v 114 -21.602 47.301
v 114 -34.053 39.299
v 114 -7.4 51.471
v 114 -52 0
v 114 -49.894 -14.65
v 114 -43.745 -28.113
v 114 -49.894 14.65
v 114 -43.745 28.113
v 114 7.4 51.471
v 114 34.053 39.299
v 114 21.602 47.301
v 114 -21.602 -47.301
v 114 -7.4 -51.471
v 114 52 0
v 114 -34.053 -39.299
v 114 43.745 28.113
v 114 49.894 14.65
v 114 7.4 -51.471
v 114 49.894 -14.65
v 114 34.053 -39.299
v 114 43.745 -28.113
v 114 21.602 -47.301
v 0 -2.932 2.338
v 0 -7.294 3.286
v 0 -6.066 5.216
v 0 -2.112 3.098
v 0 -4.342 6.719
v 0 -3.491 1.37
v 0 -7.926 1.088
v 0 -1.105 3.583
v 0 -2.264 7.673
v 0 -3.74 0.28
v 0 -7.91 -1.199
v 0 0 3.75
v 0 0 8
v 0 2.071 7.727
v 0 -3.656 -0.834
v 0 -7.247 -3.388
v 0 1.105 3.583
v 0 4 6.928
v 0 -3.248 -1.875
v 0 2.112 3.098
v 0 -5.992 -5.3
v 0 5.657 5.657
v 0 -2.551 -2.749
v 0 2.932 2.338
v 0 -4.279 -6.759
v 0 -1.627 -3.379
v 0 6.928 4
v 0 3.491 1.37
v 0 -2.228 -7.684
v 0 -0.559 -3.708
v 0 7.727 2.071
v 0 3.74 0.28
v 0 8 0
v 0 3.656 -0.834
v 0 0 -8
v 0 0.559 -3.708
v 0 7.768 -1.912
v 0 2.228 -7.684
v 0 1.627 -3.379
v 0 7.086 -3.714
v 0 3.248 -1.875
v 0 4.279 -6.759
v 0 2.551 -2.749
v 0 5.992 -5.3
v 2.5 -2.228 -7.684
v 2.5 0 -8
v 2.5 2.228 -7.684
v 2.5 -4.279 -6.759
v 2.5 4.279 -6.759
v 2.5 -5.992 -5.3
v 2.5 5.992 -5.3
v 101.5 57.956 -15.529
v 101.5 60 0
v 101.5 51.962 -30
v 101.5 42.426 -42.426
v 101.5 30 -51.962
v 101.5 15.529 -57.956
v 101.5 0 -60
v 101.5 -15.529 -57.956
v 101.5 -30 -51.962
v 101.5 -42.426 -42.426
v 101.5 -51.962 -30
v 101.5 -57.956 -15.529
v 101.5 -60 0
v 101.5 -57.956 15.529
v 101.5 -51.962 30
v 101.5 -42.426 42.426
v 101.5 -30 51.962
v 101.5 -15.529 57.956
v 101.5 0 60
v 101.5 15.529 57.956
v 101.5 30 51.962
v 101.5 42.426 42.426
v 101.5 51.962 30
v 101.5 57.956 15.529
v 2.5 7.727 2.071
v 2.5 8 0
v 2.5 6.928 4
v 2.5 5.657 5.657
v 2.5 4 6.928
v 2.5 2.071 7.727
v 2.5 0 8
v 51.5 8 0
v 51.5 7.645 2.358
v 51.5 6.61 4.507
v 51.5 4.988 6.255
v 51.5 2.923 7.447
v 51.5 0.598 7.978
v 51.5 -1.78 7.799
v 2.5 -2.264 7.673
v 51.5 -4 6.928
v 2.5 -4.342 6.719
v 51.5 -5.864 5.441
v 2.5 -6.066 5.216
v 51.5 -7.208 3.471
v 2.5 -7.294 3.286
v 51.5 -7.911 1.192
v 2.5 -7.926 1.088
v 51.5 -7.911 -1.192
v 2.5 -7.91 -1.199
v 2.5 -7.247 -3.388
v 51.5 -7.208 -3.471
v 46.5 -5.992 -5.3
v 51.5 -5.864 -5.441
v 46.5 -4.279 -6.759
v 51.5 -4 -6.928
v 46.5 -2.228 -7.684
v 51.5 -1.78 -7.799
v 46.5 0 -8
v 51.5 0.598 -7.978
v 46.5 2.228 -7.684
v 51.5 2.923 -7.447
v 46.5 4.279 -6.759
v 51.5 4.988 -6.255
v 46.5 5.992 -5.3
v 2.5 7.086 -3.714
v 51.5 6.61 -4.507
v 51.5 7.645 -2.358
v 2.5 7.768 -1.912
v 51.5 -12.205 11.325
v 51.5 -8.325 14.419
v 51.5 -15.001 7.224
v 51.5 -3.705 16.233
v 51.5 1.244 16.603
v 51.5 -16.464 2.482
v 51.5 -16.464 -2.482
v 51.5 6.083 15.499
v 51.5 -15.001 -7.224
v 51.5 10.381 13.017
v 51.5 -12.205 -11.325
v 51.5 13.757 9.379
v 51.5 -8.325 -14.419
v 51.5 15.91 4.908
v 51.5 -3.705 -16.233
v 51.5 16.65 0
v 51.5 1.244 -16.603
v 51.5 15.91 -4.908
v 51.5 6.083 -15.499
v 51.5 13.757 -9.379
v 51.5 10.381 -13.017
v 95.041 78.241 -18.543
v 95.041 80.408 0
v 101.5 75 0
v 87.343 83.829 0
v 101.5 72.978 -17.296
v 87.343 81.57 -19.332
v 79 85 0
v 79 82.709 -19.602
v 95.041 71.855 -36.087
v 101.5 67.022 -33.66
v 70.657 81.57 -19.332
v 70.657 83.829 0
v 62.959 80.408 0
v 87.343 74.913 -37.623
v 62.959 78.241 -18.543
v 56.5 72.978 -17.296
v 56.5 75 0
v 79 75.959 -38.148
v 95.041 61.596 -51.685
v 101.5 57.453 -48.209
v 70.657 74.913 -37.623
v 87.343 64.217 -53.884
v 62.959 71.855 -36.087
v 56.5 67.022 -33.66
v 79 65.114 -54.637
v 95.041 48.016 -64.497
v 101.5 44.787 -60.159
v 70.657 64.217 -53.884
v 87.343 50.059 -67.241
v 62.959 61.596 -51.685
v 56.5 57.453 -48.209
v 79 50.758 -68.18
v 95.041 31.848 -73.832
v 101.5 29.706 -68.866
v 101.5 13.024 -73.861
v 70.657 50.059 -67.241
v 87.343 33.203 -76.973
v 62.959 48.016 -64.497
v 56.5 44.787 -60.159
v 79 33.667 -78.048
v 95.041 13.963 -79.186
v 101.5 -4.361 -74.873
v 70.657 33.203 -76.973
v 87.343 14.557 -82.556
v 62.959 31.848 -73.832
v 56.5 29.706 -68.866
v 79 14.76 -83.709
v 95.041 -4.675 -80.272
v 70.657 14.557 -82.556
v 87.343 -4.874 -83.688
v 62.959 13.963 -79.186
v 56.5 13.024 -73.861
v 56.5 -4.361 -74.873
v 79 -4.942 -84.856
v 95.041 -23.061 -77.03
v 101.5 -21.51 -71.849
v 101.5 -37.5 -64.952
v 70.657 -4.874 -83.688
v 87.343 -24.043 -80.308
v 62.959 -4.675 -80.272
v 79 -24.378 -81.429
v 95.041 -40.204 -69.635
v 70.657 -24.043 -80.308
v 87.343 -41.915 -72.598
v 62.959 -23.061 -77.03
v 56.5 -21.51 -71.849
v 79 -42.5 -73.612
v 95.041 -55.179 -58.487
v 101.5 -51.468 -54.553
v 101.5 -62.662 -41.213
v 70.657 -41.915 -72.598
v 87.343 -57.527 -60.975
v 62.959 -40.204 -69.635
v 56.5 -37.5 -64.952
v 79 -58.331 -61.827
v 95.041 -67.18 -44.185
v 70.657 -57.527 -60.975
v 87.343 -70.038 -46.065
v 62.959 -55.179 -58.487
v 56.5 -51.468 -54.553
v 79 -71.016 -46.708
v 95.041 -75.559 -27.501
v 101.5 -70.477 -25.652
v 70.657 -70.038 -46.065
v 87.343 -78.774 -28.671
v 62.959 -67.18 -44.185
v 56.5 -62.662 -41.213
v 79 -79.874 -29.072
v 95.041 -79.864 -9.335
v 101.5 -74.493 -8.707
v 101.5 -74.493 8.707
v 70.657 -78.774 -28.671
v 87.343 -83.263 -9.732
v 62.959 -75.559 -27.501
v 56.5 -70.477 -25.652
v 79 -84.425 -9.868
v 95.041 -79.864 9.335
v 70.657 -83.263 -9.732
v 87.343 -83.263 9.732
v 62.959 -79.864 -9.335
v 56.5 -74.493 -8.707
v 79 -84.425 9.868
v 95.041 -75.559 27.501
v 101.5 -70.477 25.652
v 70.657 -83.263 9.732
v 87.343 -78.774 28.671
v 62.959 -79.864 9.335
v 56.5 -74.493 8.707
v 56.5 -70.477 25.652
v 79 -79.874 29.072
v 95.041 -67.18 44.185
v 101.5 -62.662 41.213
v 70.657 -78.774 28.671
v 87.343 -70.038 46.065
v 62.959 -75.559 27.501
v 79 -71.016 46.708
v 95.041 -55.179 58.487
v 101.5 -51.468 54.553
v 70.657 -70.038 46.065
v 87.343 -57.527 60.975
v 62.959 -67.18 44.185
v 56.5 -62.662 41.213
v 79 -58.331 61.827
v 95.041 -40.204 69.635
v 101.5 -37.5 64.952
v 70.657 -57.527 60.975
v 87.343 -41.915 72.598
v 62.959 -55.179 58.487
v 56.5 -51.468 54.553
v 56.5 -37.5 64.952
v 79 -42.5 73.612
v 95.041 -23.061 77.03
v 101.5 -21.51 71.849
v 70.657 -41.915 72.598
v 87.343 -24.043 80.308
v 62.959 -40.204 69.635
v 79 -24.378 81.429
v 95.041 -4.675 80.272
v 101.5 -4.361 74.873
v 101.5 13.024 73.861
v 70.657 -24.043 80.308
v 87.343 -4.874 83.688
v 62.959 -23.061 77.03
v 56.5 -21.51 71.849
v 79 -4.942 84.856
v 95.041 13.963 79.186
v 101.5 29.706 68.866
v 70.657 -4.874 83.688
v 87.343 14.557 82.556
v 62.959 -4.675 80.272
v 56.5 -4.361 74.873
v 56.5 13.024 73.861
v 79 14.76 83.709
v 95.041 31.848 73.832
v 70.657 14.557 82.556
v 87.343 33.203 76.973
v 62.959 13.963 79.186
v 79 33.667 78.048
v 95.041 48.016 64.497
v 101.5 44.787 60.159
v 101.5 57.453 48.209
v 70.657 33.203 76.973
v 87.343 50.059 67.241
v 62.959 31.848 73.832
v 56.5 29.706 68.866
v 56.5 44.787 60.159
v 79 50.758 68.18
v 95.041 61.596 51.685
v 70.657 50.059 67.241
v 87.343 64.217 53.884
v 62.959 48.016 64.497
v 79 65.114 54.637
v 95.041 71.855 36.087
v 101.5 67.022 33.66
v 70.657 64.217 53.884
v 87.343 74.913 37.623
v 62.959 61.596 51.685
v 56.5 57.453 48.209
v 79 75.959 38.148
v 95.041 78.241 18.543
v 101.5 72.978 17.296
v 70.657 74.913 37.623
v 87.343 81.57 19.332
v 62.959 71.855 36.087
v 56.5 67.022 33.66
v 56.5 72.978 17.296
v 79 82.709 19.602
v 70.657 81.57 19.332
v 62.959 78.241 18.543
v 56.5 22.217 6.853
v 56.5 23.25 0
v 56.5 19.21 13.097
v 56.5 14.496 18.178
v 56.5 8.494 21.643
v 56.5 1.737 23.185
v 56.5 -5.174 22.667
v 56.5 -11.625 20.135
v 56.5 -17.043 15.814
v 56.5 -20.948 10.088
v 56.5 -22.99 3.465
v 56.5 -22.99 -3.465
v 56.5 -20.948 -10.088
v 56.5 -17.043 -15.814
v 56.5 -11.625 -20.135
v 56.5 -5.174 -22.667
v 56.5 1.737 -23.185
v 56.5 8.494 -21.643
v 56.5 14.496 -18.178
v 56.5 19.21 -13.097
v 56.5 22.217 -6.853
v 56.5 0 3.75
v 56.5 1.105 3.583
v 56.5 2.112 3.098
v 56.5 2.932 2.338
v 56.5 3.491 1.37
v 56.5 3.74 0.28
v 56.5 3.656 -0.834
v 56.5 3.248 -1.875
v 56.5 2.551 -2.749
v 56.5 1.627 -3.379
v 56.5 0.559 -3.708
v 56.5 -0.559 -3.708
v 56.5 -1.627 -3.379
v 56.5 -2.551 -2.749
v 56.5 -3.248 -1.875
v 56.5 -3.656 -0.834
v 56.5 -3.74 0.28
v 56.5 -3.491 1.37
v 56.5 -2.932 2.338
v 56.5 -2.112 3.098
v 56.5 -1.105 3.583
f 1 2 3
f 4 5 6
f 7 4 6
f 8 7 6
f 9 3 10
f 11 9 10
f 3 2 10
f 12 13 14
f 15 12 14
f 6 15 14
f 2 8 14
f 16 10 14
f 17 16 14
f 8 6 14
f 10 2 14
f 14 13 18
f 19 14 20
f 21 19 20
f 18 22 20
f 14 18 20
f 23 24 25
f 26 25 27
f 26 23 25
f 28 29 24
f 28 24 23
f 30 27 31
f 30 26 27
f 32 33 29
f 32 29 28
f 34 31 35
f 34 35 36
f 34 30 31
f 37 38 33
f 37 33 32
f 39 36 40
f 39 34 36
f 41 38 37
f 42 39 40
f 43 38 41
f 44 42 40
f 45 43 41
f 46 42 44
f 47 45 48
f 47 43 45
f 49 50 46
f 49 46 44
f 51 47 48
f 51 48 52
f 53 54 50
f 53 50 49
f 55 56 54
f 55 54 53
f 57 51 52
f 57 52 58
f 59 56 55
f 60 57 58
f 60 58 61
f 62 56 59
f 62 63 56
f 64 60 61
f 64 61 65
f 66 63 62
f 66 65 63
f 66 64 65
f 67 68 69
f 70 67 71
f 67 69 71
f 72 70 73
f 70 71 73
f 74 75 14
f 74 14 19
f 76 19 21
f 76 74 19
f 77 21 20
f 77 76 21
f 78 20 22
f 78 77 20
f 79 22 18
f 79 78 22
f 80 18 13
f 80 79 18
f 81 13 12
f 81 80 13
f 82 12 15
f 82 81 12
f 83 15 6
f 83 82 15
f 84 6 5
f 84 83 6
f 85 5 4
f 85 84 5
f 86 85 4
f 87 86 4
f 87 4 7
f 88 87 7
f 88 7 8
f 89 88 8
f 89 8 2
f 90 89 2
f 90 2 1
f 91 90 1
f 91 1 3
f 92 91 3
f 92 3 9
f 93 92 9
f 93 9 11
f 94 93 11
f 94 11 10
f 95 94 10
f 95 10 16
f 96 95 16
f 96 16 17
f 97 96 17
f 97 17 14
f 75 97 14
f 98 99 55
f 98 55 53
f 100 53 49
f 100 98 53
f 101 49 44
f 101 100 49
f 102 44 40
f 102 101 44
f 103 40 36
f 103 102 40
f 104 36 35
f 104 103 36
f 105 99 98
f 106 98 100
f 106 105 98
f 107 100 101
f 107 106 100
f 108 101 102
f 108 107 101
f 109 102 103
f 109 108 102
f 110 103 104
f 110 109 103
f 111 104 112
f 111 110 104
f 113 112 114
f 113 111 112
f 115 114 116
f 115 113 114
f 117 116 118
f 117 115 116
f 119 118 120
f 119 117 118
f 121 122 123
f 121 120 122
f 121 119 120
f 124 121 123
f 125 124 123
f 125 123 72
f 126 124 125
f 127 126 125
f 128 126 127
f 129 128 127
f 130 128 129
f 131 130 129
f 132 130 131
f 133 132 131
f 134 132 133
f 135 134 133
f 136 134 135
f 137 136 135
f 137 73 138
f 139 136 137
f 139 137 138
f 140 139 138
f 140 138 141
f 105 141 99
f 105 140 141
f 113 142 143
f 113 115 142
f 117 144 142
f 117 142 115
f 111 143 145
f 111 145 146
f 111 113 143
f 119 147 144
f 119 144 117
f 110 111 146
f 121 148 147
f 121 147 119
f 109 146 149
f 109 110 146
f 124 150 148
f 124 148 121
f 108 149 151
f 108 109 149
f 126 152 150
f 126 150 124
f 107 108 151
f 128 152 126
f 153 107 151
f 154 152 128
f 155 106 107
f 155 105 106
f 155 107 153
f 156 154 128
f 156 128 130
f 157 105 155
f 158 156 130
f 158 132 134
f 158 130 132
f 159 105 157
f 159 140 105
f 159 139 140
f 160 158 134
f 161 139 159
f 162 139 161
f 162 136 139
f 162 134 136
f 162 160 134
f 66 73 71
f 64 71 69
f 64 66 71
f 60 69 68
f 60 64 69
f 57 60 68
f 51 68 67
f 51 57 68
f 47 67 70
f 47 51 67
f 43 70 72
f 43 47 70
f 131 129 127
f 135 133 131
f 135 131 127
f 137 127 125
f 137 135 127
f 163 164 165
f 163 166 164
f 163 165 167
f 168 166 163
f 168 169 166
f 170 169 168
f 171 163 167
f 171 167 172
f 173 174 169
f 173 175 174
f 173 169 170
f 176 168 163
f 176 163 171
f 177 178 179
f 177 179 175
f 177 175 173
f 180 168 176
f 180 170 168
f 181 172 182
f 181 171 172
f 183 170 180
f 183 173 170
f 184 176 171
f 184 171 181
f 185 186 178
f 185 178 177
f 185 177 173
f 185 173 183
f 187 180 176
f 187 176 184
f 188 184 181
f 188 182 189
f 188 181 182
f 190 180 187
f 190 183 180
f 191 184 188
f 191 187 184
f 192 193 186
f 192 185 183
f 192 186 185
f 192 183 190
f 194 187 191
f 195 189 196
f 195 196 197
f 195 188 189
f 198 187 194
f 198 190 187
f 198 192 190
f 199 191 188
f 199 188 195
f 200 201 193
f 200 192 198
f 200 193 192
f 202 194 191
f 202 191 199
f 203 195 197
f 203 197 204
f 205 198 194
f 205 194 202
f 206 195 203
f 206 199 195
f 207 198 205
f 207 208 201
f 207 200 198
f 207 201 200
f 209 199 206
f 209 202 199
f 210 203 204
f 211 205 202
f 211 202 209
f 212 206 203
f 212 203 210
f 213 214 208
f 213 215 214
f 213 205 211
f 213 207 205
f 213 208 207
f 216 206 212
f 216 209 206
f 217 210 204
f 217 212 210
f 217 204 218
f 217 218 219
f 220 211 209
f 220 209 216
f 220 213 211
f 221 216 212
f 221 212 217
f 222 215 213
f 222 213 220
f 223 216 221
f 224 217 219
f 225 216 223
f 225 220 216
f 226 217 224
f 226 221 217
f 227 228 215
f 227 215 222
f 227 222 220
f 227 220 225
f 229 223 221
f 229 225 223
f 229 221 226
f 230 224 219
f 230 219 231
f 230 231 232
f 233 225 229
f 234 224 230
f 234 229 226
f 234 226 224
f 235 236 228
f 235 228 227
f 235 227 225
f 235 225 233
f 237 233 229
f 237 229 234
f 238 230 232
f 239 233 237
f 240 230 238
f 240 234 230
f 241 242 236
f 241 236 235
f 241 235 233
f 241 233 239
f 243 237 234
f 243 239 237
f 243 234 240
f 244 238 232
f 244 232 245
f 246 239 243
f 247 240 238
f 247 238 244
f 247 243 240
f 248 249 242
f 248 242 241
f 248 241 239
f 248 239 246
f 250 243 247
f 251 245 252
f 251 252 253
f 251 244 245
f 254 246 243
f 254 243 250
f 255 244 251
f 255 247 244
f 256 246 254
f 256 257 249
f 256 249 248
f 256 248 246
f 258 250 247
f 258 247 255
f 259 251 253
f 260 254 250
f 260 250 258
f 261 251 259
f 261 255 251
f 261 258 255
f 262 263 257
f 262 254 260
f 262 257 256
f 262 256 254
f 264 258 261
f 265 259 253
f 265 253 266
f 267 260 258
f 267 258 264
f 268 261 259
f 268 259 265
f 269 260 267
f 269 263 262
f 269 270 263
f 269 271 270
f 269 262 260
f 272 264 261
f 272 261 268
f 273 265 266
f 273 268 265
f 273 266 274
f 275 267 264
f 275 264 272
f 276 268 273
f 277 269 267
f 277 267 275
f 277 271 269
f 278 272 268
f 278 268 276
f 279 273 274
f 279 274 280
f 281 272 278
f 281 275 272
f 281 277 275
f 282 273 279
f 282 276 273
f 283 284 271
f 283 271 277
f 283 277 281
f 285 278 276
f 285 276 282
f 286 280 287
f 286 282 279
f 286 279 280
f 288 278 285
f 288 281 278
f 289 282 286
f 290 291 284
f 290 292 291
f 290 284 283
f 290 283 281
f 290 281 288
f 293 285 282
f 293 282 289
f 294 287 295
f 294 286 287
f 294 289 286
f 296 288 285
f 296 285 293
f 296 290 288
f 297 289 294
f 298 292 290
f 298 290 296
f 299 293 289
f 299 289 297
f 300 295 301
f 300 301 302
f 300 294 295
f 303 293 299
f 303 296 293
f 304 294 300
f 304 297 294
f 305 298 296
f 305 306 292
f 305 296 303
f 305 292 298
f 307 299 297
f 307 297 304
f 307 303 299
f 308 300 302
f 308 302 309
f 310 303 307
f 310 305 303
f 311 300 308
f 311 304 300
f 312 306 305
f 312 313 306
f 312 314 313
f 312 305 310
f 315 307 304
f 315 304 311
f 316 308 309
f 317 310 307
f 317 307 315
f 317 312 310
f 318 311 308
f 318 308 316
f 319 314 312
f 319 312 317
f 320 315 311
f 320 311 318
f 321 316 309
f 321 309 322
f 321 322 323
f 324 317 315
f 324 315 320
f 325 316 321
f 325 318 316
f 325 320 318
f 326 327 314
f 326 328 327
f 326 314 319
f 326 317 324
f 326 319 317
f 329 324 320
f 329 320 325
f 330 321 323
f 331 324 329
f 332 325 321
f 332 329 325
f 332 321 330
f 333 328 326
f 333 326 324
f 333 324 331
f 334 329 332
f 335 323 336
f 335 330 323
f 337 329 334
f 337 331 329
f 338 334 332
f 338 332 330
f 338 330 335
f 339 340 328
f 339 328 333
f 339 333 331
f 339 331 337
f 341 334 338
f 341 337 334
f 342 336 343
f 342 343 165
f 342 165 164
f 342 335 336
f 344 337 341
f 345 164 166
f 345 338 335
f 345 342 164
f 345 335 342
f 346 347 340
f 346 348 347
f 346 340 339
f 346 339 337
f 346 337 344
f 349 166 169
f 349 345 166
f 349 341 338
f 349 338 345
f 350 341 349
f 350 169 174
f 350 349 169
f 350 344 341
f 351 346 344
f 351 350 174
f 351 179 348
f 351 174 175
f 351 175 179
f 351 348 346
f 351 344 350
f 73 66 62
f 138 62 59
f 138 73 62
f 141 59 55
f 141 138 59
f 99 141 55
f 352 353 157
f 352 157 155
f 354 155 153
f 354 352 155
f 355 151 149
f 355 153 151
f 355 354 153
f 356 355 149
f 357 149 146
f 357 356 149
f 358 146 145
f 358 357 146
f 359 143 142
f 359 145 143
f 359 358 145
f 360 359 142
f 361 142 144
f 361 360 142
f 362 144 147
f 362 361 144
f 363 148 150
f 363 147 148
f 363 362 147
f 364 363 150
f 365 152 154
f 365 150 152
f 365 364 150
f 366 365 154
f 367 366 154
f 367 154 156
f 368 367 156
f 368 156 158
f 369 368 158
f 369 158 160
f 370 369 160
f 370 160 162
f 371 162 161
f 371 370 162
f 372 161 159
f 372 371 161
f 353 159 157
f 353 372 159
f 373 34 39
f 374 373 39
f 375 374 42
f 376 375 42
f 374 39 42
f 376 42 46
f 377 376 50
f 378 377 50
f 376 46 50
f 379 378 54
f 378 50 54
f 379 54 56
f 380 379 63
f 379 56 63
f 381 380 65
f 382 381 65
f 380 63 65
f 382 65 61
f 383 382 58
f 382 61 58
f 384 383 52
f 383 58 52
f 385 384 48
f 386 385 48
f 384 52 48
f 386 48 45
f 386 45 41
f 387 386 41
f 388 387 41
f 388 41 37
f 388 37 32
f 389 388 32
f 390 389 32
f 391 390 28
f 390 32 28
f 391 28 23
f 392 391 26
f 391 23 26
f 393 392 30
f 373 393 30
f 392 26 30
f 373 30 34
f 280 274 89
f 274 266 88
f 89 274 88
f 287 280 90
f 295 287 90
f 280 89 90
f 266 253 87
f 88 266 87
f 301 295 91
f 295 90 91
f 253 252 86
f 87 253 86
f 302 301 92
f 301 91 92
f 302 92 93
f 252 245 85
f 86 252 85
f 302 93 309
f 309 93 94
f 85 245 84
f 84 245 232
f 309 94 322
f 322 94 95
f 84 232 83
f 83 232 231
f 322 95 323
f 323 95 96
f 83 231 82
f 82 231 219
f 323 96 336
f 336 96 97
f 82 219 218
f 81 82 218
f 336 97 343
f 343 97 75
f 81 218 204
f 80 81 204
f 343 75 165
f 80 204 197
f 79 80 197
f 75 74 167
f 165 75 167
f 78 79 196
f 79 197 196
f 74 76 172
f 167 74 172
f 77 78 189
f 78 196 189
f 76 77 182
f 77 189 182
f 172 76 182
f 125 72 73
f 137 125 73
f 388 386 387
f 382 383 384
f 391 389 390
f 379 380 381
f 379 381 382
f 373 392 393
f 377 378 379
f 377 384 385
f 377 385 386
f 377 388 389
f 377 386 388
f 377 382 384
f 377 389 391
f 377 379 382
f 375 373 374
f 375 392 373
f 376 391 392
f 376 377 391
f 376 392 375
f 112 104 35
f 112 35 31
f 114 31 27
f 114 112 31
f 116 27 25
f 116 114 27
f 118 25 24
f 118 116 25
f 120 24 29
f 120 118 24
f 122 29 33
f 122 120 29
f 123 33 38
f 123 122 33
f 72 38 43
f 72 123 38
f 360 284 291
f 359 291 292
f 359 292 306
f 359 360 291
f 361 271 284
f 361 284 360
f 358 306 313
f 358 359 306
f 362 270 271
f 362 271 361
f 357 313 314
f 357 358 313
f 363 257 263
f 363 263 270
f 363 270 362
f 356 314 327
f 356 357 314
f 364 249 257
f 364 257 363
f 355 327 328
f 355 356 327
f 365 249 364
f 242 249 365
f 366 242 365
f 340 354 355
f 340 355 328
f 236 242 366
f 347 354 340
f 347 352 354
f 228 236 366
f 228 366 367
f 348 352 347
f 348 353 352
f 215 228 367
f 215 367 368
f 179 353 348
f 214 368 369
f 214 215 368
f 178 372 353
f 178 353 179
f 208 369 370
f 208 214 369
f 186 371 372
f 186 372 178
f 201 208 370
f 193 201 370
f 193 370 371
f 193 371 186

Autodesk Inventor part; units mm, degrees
ref_plane "YZ Plane" through (0, 0, 0) normal (1, 0, 0) x (0, 1, 0)
ref_plane "XZ Plane" through (0, 0, 0) normal (0, 1, 0) x (-1, 0, 0)
ref_plane "XY Plane" through (0, 0, 0) normal (0, 0, 1) x (1, 0, 0)
sketch "Sketch4" plane through (0, 0, 0) normal (0, 0, 1) x (1, 0, 0)
  line L0 (0, 0) -> (0, 8)
  line L1 (0, 8) -> (51.5, 8)
  line L2 (51.5, 8) -> (51.5, 16.65)
  line L3 (51.5, 16.65) -> (56.5, 23.25)
  line L4 (56.5, 23.25) -> (56.5, 75)
  arc A0 (101.5, 75) -> (56.5, 75) centre (79, 54.6875) ccw
  line L5 (101.5, 75) -> (101.5, 60)
  line L6 (101.5, 60) -> (114, 52)
  line L7 (114, 52) -> (114, 0)
  line L8 (114, 0) -> (0, 0)
  line L9 (101.5, 75) -> (56.5, 75)
  point P0 (79, 75)
  dimension "d6" = 8
  dimension "d7" = 16.65
  dimension "d8" = 23.25
  dimension "d9" = 75
  dimension "d10" = 85
  dimension "d11" = 15
  dimension "d12" = 8
  dimension "d13" = 51.5
  dimension "d14" = 5
  dimension "d15" = 45
  dimension "d16" = 12.5
revolve "Revolution1" add sketch "Sketch4" angle 360 about axis through (114, 0, 0) along (-1, 0, 0)
sketch "Sketch5" plane through (0, 0, 0) normal (-1, 0, 0) x (0, 0, 1)
  line L0 (-5.3, -5.9925) -> (-5.3, 5.9925)
  circle A0 centre (0, 0) radius 8 projected
  circle A1 centre (0, 0) radius 8 projected
  arc A2 (-5.3, 5.9925) -> (-5.3, -5.9925) centre (0, 0) ccw
  point P0 (0, 0)
  point P1 (-8, 0)
  dimension "d18" = 5.3
extrude "Extrusion3" cut sketch "Sketch5" against normal blind 46.5 contours A0 L0 picked at (-6.6076, -0.8031)
sketch "Sketch6" plane through (0, 0, 0) normal (-1, 0, 0) x (0, 0, 1)
  circle A0 centre (0, 0) radius 8 projected
  line L0 (-5.3, -5.9925) -> (-5.3, 5.9925)
  arc A1 (-5.3, 5.9925) -> (-5.3, -5.9925) centre (0, 0) ccw
  point P0 (0, 0)
  point P1 (-8, 0)
extrude "Extrusion4" add sketch "Sketch6" against normal blind 2.5
sketch "Sketch7" plane through (0, 0, 0) normal (-1, 0, 0) x (0, 0, 1)
  circle A0 centre (0, 0) radius 3.75
  point P0 (0, 0)
  dimension "d23" = 7.5
extrude "Extrusion5" cut sketch "Sketch7" against normal up to surface (56.5 mm away)
properties part number "Wheel" material "Stainless Steel"
